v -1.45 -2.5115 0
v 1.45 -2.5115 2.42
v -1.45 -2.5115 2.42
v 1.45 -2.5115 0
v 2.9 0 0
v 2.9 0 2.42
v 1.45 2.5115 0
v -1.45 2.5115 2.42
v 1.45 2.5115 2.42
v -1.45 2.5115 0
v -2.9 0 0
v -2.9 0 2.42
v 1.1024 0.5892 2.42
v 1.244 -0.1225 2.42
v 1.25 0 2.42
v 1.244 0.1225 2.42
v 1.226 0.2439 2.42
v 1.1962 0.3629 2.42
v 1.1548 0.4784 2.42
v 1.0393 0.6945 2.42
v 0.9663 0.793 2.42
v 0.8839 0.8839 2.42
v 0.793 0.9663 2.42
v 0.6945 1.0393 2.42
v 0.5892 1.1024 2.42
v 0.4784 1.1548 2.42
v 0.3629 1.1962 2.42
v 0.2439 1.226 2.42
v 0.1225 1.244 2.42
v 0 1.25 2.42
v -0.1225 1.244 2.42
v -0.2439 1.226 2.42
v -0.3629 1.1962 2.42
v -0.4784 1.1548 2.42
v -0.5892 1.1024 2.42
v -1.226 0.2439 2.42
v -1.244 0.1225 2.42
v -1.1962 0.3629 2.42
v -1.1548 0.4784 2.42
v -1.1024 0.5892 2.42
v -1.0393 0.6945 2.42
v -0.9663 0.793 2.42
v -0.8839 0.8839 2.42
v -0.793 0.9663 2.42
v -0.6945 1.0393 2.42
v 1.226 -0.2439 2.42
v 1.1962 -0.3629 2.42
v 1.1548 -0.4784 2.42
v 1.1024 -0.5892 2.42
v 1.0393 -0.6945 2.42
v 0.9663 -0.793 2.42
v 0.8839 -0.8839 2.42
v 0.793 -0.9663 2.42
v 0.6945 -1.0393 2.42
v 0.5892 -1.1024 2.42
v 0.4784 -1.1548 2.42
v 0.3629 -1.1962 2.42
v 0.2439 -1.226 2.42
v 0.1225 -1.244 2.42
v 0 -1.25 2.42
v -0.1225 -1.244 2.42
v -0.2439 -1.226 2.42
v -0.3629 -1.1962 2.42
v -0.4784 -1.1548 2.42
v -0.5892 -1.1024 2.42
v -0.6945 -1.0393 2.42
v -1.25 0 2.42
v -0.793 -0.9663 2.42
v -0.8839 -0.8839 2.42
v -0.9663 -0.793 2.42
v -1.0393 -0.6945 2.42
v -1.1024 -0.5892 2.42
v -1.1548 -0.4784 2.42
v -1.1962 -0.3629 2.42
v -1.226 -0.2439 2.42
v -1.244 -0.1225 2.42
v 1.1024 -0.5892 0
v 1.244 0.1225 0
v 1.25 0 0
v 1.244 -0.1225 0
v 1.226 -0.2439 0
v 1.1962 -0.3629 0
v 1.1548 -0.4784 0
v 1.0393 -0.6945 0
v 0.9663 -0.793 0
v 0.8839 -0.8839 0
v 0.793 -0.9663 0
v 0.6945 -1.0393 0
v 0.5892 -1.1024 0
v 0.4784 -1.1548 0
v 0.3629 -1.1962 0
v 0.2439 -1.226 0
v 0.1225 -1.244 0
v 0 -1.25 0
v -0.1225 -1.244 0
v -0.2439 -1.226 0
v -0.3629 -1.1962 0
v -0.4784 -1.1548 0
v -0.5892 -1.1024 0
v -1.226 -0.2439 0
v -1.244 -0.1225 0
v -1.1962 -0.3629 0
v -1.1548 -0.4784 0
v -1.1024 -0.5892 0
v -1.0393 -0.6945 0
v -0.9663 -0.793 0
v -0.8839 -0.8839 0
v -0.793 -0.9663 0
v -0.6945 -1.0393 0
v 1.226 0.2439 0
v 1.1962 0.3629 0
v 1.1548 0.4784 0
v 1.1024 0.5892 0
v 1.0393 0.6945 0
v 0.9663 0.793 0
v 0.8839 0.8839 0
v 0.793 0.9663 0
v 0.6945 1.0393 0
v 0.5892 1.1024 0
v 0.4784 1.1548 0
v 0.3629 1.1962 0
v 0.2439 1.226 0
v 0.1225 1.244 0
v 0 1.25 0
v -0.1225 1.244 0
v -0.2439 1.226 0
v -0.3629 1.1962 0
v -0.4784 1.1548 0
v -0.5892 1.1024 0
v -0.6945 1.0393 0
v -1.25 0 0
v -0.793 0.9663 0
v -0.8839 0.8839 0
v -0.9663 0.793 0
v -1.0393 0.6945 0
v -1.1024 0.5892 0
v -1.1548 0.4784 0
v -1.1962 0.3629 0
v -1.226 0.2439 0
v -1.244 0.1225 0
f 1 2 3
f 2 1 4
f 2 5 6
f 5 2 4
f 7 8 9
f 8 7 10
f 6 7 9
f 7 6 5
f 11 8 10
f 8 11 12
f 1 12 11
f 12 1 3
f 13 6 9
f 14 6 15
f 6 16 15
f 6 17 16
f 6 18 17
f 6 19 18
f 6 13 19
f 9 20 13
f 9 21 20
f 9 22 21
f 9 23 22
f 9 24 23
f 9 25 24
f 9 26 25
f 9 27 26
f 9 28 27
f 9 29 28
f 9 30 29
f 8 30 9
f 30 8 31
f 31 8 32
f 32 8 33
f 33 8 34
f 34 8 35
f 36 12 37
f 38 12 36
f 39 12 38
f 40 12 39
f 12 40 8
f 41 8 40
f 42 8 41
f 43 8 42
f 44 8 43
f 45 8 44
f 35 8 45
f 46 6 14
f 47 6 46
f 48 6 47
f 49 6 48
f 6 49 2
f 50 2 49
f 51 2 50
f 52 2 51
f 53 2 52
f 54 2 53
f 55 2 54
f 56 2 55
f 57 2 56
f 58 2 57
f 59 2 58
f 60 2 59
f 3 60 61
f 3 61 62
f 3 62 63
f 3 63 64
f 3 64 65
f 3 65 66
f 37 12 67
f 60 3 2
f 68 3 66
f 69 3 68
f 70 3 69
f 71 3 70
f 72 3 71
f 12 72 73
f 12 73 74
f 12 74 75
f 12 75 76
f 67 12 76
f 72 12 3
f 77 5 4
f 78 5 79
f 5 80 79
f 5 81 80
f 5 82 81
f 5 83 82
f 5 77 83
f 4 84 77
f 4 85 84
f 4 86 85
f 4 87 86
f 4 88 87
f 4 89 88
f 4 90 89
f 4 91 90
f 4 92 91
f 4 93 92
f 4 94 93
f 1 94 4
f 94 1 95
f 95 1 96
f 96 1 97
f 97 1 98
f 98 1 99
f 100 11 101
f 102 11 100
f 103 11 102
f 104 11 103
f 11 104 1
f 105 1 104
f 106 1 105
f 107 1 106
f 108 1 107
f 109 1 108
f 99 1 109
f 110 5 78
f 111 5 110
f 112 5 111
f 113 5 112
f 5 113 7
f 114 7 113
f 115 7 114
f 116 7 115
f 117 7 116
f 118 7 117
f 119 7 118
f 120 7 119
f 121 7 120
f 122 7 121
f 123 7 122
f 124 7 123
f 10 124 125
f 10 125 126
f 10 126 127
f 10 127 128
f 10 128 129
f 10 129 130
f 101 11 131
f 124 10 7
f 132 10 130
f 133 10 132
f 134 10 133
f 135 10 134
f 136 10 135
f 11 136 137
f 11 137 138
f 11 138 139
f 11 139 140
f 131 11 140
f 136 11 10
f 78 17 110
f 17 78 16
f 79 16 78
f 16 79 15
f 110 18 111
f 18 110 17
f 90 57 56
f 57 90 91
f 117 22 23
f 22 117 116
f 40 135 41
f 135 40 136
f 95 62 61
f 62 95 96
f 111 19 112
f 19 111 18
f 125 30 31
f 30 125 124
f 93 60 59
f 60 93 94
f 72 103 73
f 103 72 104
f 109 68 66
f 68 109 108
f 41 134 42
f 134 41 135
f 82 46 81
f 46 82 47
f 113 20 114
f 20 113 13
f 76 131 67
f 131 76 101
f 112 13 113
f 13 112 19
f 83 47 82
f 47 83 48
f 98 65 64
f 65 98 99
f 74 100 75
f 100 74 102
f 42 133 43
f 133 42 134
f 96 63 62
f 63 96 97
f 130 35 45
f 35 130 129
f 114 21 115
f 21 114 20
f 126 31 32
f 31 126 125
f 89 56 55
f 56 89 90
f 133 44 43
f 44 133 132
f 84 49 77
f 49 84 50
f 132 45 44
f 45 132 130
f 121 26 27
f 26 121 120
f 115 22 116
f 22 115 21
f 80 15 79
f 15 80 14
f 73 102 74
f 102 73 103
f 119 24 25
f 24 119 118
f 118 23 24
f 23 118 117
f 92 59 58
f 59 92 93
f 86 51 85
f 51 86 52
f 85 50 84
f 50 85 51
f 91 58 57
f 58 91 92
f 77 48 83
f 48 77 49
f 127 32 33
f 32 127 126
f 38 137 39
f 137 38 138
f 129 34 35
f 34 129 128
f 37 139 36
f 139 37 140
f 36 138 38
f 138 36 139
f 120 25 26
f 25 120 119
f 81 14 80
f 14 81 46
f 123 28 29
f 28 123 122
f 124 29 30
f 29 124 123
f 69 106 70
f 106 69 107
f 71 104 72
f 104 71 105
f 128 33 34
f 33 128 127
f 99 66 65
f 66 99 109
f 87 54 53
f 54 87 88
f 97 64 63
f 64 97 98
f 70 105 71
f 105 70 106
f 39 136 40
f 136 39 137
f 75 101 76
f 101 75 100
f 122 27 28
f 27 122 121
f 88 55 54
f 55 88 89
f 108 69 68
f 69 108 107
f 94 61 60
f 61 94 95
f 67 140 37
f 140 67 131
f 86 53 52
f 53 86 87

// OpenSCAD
module hex_nut() {
    difference() {
        // Hexagon shape
        scale([5.8/2, 5.8/2, 2.2/2])
            cylinder(h=2.2, r=1, $fn=6);
        // Hole for the screw
        translate([0, 0, -1])
            cylinder(h=4, r=1.25, $fn=64);
    }
}

hex_nut();
